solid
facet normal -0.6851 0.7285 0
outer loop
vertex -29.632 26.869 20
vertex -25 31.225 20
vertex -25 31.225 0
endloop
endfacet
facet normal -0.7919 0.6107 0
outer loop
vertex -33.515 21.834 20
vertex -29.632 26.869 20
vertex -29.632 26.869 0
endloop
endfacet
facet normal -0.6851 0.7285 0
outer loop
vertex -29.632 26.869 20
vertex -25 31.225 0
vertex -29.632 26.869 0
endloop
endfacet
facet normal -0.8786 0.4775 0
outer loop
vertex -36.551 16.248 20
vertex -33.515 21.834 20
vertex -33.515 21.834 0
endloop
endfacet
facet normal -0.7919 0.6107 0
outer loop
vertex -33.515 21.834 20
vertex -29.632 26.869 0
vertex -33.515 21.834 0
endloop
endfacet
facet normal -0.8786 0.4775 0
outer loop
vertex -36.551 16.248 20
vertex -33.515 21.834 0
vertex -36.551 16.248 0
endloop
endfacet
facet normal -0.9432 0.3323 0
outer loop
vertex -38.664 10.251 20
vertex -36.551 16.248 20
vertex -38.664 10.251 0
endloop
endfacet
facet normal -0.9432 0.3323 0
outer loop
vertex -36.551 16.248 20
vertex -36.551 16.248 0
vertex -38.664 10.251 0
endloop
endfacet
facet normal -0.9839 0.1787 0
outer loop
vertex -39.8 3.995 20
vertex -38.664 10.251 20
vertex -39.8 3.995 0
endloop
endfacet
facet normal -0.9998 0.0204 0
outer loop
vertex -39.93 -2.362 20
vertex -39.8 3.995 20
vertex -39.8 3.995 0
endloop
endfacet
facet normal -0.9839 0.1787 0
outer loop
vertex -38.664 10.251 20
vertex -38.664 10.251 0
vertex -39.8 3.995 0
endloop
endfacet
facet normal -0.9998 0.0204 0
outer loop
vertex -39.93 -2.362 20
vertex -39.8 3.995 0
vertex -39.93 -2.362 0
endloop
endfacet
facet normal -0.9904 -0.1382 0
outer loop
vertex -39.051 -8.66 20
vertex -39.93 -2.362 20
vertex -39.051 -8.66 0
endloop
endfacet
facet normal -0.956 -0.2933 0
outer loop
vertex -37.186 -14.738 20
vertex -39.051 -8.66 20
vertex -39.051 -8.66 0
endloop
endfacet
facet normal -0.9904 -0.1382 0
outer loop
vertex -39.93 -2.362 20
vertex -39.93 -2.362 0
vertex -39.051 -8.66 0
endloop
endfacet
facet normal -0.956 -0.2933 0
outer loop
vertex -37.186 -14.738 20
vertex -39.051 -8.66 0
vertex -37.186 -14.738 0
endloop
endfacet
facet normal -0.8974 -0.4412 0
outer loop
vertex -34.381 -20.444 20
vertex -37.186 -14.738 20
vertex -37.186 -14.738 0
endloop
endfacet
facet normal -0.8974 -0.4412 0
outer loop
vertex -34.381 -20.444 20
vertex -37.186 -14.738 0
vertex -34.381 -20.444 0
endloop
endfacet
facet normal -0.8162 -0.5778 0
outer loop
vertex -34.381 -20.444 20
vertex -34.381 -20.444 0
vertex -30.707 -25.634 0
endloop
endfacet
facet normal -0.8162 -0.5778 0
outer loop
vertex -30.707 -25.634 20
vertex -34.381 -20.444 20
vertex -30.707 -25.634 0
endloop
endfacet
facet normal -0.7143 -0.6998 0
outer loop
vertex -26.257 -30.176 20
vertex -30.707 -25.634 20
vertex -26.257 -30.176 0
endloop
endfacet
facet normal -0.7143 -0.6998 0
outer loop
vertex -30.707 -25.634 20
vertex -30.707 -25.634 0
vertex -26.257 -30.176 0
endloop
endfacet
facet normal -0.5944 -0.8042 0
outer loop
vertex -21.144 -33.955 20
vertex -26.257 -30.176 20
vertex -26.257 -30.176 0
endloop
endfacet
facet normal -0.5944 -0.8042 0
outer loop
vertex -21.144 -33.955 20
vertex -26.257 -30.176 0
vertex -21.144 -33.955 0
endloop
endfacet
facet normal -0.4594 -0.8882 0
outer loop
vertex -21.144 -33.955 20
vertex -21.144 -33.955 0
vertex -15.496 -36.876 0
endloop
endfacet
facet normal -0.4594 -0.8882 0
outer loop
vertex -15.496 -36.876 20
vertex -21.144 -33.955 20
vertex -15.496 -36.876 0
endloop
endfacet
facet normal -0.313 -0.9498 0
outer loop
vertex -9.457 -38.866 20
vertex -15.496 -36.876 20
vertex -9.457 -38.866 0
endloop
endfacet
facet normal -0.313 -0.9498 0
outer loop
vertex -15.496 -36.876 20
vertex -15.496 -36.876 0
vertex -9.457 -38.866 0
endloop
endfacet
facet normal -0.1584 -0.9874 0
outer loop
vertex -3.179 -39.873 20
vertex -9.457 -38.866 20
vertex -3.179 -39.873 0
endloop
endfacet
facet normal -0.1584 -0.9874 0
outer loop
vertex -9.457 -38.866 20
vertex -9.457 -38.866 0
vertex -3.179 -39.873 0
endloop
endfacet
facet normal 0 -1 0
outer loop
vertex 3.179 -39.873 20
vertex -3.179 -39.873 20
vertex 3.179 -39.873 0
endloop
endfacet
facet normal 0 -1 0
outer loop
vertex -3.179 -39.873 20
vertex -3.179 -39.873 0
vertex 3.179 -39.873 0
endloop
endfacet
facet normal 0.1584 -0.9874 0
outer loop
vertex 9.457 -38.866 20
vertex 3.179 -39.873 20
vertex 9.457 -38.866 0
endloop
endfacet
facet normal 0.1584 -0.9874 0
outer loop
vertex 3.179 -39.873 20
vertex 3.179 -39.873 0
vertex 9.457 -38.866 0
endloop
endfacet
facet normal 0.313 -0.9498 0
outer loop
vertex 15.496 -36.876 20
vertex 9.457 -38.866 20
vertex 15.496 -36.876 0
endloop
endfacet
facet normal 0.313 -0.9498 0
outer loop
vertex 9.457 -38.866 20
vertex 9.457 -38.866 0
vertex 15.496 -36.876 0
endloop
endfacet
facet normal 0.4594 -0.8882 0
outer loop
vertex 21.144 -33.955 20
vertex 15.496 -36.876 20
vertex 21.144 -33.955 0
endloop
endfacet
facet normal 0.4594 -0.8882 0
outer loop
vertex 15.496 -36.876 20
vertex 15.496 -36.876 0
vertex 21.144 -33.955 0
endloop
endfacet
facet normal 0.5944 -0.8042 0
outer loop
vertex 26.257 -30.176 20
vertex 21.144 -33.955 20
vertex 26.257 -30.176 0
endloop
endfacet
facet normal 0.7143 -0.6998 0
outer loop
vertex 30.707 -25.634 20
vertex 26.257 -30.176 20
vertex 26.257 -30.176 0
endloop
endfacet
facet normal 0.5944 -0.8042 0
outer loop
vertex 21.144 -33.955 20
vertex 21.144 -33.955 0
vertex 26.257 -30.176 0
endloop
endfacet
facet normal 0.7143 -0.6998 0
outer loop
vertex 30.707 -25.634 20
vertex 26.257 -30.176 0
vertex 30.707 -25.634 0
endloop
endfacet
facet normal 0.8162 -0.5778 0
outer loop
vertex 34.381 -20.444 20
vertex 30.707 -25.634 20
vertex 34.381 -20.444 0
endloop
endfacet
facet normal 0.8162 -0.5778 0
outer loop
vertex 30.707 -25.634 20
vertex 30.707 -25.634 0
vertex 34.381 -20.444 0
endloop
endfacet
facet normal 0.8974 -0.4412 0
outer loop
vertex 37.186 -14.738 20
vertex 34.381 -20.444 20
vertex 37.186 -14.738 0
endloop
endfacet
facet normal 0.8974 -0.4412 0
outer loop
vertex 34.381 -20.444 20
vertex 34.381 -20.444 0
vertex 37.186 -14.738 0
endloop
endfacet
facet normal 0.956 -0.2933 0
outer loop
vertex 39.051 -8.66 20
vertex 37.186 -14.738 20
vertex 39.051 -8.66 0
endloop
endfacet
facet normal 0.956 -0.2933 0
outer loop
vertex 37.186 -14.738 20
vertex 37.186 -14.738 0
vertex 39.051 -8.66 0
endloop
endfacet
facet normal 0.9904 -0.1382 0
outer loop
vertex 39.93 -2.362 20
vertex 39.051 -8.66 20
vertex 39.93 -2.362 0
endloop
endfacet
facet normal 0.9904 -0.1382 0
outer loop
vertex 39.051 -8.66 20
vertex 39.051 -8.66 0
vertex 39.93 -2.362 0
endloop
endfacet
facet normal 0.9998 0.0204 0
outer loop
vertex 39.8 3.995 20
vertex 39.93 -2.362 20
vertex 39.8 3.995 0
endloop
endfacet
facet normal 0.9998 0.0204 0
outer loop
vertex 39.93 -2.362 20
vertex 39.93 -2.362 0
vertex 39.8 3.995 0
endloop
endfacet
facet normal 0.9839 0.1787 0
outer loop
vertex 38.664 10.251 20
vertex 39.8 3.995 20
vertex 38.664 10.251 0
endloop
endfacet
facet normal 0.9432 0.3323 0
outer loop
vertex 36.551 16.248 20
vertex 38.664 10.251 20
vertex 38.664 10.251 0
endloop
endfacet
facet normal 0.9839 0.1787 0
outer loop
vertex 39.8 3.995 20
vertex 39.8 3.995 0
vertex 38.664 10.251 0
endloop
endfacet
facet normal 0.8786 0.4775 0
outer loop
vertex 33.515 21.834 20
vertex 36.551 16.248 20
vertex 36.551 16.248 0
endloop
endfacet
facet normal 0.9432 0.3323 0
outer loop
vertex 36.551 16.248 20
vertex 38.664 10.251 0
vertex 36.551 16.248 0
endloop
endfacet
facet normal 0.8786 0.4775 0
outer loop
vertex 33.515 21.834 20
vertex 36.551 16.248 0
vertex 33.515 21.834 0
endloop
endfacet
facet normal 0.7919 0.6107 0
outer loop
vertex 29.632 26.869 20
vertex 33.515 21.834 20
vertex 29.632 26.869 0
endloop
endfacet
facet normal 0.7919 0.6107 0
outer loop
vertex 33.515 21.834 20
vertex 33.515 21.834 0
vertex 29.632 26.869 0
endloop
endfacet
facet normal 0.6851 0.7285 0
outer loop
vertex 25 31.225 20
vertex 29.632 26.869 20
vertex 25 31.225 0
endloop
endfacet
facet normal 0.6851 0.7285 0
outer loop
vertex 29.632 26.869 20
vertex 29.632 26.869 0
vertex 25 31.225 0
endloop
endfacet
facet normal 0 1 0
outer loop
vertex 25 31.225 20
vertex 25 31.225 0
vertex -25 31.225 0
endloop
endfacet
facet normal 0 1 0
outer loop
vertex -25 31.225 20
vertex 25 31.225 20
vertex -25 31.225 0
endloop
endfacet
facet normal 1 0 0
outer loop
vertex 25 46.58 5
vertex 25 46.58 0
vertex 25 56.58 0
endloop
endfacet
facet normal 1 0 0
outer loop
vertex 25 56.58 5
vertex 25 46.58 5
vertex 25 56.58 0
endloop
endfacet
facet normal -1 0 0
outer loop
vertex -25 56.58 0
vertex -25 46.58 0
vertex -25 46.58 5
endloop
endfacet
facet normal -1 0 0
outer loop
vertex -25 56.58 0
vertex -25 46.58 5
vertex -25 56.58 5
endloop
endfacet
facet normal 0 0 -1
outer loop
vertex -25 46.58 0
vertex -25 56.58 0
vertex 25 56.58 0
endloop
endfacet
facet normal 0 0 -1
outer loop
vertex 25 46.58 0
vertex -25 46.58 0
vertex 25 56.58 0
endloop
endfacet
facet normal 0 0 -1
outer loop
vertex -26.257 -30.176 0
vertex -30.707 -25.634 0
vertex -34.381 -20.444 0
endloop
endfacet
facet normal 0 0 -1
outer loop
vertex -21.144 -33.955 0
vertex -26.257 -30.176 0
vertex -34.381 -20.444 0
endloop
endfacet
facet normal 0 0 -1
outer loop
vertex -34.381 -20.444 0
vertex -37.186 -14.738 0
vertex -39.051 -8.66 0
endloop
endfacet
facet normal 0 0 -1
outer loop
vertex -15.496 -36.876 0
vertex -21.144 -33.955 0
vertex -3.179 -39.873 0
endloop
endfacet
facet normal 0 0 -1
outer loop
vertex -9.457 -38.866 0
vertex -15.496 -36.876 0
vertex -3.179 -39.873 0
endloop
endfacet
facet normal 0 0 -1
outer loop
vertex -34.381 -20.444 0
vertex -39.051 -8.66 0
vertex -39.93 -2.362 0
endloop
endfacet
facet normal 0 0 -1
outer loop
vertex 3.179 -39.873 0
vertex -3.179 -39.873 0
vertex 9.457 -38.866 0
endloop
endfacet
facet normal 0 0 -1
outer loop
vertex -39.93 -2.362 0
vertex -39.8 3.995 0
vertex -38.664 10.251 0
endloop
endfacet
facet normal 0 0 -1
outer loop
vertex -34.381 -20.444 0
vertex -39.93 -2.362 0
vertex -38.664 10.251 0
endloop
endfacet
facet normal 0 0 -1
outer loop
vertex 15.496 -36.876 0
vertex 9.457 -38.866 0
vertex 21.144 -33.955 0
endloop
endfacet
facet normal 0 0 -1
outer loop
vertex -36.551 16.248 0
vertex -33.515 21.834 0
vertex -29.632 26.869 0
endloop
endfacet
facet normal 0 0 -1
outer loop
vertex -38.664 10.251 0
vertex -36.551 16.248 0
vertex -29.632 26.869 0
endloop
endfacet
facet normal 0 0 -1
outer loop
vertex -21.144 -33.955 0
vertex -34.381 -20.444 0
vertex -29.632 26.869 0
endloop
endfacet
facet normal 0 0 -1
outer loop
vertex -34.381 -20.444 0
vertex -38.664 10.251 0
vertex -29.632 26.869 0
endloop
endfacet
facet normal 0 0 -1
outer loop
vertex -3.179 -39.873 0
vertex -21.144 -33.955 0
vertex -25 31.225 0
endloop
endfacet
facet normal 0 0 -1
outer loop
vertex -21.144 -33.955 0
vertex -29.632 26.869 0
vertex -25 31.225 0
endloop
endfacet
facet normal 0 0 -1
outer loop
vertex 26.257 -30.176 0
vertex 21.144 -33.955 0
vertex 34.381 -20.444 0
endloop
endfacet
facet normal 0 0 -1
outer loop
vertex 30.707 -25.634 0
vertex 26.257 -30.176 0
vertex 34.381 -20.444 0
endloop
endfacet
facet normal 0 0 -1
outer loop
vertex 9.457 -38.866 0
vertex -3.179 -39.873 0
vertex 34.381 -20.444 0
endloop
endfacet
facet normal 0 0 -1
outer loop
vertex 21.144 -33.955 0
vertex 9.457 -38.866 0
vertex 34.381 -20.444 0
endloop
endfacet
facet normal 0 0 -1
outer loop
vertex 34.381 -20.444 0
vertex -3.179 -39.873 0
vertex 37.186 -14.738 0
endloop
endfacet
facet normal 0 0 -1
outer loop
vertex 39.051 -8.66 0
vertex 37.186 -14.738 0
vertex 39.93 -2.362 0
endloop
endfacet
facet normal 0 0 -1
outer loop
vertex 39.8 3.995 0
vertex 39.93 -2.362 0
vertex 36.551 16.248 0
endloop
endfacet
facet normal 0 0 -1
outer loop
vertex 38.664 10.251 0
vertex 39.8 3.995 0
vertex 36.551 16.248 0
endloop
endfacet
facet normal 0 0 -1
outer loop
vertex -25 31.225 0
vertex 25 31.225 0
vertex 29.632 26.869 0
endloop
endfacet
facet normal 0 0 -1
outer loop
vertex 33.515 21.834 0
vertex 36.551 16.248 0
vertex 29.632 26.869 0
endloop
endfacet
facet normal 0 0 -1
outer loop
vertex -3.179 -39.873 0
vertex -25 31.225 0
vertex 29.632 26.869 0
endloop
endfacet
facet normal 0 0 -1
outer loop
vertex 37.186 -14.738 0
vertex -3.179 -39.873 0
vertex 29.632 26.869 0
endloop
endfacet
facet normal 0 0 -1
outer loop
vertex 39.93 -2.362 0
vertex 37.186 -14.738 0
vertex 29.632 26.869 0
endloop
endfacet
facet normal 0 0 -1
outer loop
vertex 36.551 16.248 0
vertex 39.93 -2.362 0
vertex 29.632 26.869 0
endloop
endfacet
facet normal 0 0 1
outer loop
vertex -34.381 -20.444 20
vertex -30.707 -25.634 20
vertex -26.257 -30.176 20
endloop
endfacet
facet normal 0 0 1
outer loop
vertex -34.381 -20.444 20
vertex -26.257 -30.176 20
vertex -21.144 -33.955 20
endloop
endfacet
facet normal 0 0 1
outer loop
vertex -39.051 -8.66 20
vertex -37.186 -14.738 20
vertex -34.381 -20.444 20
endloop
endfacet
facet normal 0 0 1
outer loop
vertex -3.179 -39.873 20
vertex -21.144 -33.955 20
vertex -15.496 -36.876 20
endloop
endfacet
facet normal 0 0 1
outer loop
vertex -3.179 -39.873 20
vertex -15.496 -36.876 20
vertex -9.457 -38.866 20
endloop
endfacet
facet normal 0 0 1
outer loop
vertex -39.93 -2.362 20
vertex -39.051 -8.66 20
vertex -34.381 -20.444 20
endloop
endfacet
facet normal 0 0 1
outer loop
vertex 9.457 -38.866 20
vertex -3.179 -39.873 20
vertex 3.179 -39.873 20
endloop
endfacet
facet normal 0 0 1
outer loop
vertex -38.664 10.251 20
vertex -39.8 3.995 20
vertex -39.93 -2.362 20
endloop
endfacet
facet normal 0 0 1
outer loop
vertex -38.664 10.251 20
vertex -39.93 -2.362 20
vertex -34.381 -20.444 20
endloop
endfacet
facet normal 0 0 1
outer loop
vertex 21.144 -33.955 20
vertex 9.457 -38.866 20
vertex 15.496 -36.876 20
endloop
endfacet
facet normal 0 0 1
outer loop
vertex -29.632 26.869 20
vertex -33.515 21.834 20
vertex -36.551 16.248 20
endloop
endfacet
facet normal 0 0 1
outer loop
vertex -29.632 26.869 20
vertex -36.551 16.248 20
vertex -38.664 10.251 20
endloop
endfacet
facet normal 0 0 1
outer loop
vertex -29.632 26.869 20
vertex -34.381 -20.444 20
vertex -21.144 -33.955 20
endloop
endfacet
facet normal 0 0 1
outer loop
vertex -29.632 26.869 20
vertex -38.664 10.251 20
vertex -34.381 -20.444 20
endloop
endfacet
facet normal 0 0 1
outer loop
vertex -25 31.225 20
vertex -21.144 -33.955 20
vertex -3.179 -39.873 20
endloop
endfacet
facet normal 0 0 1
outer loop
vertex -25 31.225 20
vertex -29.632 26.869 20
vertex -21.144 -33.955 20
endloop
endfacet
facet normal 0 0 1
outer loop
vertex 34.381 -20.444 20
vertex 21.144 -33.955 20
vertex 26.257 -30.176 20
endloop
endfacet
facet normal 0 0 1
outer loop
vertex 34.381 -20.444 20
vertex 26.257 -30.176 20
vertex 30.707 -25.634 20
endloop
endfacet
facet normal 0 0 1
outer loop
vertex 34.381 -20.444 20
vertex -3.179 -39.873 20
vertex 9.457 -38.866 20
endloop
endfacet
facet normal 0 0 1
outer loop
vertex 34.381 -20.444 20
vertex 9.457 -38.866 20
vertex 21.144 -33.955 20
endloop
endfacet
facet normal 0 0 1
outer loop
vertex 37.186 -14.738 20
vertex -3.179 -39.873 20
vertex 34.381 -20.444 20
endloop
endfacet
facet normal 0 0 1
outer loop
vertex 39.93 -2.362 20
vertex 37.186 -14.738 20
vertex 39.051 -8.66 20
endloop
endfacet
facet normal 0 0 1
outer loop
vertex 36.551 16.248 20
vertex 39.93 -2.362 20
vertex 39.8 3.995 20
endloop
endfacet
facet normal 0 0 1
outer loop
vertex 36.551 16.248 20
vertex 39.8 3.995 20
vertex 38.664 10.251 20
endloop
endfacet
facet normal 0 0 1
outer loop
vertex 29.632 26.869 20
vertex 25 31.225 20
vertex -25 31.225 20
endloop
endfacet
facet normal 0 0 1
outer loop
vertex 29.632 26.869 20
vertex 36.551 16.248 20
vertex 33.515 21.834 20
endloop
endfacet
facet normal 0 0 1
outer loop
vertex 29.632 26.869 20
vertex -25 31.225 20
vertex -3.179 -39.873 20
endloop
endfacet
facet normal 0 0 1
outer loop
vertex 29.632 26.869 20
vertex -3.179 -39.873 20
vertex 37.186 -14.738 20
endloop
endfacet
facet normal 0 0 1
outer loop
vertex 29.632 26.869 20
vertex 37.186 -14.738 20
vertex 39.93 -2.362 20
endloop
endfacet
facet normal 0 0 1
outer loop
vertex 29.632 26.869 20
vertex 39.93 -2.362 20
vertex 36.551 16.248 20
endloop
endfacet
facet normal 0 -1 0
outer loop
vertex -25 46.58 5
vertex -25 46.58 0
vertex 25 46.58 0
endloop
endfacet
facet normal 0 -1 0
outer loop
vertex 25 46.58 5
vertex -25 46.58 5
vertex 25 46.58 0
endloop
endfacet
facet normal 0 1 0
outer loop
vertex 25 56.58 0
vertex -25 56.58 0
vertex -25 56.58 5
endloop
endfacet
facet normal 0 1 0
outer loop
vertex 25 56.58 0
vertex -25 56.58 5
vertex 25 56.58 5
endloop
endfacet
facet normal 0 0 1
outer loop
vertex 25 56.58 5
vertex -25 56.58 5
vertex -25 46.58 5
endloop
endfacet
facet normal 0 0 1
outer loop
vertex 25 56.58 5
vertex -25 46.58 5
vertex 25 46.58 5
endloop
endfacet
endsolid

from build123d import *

# Parameters (mm, degrees)
F1_DEPTH = 20
F0_W     = 50
F0_H     = 10
F2_DEPTH = 5


with BuildPart() as f1:
    # F0 (on Top) → F1 (new body)
    with BuildSketch(Plane.XY):
        with BuildLine():
            Line((25, 31.22499), (-25, 31.22499))
            ThreePointArc((-25, 31.22499), (0, -40), (25, 31.22499))
        make_face()
    extrude(amount=F1_DEPTH)


with BuildPart() as f2:
    # F0 (on Top) → F2 (new body)
    with BuildSketch(Plane.XY):
        with Locations((0, 51.579577)):
            Rectangle(F0_W, F0_H)
    extrude(amount=F2_DEPTH)


solid = Compound([f1.part, f2.part])
